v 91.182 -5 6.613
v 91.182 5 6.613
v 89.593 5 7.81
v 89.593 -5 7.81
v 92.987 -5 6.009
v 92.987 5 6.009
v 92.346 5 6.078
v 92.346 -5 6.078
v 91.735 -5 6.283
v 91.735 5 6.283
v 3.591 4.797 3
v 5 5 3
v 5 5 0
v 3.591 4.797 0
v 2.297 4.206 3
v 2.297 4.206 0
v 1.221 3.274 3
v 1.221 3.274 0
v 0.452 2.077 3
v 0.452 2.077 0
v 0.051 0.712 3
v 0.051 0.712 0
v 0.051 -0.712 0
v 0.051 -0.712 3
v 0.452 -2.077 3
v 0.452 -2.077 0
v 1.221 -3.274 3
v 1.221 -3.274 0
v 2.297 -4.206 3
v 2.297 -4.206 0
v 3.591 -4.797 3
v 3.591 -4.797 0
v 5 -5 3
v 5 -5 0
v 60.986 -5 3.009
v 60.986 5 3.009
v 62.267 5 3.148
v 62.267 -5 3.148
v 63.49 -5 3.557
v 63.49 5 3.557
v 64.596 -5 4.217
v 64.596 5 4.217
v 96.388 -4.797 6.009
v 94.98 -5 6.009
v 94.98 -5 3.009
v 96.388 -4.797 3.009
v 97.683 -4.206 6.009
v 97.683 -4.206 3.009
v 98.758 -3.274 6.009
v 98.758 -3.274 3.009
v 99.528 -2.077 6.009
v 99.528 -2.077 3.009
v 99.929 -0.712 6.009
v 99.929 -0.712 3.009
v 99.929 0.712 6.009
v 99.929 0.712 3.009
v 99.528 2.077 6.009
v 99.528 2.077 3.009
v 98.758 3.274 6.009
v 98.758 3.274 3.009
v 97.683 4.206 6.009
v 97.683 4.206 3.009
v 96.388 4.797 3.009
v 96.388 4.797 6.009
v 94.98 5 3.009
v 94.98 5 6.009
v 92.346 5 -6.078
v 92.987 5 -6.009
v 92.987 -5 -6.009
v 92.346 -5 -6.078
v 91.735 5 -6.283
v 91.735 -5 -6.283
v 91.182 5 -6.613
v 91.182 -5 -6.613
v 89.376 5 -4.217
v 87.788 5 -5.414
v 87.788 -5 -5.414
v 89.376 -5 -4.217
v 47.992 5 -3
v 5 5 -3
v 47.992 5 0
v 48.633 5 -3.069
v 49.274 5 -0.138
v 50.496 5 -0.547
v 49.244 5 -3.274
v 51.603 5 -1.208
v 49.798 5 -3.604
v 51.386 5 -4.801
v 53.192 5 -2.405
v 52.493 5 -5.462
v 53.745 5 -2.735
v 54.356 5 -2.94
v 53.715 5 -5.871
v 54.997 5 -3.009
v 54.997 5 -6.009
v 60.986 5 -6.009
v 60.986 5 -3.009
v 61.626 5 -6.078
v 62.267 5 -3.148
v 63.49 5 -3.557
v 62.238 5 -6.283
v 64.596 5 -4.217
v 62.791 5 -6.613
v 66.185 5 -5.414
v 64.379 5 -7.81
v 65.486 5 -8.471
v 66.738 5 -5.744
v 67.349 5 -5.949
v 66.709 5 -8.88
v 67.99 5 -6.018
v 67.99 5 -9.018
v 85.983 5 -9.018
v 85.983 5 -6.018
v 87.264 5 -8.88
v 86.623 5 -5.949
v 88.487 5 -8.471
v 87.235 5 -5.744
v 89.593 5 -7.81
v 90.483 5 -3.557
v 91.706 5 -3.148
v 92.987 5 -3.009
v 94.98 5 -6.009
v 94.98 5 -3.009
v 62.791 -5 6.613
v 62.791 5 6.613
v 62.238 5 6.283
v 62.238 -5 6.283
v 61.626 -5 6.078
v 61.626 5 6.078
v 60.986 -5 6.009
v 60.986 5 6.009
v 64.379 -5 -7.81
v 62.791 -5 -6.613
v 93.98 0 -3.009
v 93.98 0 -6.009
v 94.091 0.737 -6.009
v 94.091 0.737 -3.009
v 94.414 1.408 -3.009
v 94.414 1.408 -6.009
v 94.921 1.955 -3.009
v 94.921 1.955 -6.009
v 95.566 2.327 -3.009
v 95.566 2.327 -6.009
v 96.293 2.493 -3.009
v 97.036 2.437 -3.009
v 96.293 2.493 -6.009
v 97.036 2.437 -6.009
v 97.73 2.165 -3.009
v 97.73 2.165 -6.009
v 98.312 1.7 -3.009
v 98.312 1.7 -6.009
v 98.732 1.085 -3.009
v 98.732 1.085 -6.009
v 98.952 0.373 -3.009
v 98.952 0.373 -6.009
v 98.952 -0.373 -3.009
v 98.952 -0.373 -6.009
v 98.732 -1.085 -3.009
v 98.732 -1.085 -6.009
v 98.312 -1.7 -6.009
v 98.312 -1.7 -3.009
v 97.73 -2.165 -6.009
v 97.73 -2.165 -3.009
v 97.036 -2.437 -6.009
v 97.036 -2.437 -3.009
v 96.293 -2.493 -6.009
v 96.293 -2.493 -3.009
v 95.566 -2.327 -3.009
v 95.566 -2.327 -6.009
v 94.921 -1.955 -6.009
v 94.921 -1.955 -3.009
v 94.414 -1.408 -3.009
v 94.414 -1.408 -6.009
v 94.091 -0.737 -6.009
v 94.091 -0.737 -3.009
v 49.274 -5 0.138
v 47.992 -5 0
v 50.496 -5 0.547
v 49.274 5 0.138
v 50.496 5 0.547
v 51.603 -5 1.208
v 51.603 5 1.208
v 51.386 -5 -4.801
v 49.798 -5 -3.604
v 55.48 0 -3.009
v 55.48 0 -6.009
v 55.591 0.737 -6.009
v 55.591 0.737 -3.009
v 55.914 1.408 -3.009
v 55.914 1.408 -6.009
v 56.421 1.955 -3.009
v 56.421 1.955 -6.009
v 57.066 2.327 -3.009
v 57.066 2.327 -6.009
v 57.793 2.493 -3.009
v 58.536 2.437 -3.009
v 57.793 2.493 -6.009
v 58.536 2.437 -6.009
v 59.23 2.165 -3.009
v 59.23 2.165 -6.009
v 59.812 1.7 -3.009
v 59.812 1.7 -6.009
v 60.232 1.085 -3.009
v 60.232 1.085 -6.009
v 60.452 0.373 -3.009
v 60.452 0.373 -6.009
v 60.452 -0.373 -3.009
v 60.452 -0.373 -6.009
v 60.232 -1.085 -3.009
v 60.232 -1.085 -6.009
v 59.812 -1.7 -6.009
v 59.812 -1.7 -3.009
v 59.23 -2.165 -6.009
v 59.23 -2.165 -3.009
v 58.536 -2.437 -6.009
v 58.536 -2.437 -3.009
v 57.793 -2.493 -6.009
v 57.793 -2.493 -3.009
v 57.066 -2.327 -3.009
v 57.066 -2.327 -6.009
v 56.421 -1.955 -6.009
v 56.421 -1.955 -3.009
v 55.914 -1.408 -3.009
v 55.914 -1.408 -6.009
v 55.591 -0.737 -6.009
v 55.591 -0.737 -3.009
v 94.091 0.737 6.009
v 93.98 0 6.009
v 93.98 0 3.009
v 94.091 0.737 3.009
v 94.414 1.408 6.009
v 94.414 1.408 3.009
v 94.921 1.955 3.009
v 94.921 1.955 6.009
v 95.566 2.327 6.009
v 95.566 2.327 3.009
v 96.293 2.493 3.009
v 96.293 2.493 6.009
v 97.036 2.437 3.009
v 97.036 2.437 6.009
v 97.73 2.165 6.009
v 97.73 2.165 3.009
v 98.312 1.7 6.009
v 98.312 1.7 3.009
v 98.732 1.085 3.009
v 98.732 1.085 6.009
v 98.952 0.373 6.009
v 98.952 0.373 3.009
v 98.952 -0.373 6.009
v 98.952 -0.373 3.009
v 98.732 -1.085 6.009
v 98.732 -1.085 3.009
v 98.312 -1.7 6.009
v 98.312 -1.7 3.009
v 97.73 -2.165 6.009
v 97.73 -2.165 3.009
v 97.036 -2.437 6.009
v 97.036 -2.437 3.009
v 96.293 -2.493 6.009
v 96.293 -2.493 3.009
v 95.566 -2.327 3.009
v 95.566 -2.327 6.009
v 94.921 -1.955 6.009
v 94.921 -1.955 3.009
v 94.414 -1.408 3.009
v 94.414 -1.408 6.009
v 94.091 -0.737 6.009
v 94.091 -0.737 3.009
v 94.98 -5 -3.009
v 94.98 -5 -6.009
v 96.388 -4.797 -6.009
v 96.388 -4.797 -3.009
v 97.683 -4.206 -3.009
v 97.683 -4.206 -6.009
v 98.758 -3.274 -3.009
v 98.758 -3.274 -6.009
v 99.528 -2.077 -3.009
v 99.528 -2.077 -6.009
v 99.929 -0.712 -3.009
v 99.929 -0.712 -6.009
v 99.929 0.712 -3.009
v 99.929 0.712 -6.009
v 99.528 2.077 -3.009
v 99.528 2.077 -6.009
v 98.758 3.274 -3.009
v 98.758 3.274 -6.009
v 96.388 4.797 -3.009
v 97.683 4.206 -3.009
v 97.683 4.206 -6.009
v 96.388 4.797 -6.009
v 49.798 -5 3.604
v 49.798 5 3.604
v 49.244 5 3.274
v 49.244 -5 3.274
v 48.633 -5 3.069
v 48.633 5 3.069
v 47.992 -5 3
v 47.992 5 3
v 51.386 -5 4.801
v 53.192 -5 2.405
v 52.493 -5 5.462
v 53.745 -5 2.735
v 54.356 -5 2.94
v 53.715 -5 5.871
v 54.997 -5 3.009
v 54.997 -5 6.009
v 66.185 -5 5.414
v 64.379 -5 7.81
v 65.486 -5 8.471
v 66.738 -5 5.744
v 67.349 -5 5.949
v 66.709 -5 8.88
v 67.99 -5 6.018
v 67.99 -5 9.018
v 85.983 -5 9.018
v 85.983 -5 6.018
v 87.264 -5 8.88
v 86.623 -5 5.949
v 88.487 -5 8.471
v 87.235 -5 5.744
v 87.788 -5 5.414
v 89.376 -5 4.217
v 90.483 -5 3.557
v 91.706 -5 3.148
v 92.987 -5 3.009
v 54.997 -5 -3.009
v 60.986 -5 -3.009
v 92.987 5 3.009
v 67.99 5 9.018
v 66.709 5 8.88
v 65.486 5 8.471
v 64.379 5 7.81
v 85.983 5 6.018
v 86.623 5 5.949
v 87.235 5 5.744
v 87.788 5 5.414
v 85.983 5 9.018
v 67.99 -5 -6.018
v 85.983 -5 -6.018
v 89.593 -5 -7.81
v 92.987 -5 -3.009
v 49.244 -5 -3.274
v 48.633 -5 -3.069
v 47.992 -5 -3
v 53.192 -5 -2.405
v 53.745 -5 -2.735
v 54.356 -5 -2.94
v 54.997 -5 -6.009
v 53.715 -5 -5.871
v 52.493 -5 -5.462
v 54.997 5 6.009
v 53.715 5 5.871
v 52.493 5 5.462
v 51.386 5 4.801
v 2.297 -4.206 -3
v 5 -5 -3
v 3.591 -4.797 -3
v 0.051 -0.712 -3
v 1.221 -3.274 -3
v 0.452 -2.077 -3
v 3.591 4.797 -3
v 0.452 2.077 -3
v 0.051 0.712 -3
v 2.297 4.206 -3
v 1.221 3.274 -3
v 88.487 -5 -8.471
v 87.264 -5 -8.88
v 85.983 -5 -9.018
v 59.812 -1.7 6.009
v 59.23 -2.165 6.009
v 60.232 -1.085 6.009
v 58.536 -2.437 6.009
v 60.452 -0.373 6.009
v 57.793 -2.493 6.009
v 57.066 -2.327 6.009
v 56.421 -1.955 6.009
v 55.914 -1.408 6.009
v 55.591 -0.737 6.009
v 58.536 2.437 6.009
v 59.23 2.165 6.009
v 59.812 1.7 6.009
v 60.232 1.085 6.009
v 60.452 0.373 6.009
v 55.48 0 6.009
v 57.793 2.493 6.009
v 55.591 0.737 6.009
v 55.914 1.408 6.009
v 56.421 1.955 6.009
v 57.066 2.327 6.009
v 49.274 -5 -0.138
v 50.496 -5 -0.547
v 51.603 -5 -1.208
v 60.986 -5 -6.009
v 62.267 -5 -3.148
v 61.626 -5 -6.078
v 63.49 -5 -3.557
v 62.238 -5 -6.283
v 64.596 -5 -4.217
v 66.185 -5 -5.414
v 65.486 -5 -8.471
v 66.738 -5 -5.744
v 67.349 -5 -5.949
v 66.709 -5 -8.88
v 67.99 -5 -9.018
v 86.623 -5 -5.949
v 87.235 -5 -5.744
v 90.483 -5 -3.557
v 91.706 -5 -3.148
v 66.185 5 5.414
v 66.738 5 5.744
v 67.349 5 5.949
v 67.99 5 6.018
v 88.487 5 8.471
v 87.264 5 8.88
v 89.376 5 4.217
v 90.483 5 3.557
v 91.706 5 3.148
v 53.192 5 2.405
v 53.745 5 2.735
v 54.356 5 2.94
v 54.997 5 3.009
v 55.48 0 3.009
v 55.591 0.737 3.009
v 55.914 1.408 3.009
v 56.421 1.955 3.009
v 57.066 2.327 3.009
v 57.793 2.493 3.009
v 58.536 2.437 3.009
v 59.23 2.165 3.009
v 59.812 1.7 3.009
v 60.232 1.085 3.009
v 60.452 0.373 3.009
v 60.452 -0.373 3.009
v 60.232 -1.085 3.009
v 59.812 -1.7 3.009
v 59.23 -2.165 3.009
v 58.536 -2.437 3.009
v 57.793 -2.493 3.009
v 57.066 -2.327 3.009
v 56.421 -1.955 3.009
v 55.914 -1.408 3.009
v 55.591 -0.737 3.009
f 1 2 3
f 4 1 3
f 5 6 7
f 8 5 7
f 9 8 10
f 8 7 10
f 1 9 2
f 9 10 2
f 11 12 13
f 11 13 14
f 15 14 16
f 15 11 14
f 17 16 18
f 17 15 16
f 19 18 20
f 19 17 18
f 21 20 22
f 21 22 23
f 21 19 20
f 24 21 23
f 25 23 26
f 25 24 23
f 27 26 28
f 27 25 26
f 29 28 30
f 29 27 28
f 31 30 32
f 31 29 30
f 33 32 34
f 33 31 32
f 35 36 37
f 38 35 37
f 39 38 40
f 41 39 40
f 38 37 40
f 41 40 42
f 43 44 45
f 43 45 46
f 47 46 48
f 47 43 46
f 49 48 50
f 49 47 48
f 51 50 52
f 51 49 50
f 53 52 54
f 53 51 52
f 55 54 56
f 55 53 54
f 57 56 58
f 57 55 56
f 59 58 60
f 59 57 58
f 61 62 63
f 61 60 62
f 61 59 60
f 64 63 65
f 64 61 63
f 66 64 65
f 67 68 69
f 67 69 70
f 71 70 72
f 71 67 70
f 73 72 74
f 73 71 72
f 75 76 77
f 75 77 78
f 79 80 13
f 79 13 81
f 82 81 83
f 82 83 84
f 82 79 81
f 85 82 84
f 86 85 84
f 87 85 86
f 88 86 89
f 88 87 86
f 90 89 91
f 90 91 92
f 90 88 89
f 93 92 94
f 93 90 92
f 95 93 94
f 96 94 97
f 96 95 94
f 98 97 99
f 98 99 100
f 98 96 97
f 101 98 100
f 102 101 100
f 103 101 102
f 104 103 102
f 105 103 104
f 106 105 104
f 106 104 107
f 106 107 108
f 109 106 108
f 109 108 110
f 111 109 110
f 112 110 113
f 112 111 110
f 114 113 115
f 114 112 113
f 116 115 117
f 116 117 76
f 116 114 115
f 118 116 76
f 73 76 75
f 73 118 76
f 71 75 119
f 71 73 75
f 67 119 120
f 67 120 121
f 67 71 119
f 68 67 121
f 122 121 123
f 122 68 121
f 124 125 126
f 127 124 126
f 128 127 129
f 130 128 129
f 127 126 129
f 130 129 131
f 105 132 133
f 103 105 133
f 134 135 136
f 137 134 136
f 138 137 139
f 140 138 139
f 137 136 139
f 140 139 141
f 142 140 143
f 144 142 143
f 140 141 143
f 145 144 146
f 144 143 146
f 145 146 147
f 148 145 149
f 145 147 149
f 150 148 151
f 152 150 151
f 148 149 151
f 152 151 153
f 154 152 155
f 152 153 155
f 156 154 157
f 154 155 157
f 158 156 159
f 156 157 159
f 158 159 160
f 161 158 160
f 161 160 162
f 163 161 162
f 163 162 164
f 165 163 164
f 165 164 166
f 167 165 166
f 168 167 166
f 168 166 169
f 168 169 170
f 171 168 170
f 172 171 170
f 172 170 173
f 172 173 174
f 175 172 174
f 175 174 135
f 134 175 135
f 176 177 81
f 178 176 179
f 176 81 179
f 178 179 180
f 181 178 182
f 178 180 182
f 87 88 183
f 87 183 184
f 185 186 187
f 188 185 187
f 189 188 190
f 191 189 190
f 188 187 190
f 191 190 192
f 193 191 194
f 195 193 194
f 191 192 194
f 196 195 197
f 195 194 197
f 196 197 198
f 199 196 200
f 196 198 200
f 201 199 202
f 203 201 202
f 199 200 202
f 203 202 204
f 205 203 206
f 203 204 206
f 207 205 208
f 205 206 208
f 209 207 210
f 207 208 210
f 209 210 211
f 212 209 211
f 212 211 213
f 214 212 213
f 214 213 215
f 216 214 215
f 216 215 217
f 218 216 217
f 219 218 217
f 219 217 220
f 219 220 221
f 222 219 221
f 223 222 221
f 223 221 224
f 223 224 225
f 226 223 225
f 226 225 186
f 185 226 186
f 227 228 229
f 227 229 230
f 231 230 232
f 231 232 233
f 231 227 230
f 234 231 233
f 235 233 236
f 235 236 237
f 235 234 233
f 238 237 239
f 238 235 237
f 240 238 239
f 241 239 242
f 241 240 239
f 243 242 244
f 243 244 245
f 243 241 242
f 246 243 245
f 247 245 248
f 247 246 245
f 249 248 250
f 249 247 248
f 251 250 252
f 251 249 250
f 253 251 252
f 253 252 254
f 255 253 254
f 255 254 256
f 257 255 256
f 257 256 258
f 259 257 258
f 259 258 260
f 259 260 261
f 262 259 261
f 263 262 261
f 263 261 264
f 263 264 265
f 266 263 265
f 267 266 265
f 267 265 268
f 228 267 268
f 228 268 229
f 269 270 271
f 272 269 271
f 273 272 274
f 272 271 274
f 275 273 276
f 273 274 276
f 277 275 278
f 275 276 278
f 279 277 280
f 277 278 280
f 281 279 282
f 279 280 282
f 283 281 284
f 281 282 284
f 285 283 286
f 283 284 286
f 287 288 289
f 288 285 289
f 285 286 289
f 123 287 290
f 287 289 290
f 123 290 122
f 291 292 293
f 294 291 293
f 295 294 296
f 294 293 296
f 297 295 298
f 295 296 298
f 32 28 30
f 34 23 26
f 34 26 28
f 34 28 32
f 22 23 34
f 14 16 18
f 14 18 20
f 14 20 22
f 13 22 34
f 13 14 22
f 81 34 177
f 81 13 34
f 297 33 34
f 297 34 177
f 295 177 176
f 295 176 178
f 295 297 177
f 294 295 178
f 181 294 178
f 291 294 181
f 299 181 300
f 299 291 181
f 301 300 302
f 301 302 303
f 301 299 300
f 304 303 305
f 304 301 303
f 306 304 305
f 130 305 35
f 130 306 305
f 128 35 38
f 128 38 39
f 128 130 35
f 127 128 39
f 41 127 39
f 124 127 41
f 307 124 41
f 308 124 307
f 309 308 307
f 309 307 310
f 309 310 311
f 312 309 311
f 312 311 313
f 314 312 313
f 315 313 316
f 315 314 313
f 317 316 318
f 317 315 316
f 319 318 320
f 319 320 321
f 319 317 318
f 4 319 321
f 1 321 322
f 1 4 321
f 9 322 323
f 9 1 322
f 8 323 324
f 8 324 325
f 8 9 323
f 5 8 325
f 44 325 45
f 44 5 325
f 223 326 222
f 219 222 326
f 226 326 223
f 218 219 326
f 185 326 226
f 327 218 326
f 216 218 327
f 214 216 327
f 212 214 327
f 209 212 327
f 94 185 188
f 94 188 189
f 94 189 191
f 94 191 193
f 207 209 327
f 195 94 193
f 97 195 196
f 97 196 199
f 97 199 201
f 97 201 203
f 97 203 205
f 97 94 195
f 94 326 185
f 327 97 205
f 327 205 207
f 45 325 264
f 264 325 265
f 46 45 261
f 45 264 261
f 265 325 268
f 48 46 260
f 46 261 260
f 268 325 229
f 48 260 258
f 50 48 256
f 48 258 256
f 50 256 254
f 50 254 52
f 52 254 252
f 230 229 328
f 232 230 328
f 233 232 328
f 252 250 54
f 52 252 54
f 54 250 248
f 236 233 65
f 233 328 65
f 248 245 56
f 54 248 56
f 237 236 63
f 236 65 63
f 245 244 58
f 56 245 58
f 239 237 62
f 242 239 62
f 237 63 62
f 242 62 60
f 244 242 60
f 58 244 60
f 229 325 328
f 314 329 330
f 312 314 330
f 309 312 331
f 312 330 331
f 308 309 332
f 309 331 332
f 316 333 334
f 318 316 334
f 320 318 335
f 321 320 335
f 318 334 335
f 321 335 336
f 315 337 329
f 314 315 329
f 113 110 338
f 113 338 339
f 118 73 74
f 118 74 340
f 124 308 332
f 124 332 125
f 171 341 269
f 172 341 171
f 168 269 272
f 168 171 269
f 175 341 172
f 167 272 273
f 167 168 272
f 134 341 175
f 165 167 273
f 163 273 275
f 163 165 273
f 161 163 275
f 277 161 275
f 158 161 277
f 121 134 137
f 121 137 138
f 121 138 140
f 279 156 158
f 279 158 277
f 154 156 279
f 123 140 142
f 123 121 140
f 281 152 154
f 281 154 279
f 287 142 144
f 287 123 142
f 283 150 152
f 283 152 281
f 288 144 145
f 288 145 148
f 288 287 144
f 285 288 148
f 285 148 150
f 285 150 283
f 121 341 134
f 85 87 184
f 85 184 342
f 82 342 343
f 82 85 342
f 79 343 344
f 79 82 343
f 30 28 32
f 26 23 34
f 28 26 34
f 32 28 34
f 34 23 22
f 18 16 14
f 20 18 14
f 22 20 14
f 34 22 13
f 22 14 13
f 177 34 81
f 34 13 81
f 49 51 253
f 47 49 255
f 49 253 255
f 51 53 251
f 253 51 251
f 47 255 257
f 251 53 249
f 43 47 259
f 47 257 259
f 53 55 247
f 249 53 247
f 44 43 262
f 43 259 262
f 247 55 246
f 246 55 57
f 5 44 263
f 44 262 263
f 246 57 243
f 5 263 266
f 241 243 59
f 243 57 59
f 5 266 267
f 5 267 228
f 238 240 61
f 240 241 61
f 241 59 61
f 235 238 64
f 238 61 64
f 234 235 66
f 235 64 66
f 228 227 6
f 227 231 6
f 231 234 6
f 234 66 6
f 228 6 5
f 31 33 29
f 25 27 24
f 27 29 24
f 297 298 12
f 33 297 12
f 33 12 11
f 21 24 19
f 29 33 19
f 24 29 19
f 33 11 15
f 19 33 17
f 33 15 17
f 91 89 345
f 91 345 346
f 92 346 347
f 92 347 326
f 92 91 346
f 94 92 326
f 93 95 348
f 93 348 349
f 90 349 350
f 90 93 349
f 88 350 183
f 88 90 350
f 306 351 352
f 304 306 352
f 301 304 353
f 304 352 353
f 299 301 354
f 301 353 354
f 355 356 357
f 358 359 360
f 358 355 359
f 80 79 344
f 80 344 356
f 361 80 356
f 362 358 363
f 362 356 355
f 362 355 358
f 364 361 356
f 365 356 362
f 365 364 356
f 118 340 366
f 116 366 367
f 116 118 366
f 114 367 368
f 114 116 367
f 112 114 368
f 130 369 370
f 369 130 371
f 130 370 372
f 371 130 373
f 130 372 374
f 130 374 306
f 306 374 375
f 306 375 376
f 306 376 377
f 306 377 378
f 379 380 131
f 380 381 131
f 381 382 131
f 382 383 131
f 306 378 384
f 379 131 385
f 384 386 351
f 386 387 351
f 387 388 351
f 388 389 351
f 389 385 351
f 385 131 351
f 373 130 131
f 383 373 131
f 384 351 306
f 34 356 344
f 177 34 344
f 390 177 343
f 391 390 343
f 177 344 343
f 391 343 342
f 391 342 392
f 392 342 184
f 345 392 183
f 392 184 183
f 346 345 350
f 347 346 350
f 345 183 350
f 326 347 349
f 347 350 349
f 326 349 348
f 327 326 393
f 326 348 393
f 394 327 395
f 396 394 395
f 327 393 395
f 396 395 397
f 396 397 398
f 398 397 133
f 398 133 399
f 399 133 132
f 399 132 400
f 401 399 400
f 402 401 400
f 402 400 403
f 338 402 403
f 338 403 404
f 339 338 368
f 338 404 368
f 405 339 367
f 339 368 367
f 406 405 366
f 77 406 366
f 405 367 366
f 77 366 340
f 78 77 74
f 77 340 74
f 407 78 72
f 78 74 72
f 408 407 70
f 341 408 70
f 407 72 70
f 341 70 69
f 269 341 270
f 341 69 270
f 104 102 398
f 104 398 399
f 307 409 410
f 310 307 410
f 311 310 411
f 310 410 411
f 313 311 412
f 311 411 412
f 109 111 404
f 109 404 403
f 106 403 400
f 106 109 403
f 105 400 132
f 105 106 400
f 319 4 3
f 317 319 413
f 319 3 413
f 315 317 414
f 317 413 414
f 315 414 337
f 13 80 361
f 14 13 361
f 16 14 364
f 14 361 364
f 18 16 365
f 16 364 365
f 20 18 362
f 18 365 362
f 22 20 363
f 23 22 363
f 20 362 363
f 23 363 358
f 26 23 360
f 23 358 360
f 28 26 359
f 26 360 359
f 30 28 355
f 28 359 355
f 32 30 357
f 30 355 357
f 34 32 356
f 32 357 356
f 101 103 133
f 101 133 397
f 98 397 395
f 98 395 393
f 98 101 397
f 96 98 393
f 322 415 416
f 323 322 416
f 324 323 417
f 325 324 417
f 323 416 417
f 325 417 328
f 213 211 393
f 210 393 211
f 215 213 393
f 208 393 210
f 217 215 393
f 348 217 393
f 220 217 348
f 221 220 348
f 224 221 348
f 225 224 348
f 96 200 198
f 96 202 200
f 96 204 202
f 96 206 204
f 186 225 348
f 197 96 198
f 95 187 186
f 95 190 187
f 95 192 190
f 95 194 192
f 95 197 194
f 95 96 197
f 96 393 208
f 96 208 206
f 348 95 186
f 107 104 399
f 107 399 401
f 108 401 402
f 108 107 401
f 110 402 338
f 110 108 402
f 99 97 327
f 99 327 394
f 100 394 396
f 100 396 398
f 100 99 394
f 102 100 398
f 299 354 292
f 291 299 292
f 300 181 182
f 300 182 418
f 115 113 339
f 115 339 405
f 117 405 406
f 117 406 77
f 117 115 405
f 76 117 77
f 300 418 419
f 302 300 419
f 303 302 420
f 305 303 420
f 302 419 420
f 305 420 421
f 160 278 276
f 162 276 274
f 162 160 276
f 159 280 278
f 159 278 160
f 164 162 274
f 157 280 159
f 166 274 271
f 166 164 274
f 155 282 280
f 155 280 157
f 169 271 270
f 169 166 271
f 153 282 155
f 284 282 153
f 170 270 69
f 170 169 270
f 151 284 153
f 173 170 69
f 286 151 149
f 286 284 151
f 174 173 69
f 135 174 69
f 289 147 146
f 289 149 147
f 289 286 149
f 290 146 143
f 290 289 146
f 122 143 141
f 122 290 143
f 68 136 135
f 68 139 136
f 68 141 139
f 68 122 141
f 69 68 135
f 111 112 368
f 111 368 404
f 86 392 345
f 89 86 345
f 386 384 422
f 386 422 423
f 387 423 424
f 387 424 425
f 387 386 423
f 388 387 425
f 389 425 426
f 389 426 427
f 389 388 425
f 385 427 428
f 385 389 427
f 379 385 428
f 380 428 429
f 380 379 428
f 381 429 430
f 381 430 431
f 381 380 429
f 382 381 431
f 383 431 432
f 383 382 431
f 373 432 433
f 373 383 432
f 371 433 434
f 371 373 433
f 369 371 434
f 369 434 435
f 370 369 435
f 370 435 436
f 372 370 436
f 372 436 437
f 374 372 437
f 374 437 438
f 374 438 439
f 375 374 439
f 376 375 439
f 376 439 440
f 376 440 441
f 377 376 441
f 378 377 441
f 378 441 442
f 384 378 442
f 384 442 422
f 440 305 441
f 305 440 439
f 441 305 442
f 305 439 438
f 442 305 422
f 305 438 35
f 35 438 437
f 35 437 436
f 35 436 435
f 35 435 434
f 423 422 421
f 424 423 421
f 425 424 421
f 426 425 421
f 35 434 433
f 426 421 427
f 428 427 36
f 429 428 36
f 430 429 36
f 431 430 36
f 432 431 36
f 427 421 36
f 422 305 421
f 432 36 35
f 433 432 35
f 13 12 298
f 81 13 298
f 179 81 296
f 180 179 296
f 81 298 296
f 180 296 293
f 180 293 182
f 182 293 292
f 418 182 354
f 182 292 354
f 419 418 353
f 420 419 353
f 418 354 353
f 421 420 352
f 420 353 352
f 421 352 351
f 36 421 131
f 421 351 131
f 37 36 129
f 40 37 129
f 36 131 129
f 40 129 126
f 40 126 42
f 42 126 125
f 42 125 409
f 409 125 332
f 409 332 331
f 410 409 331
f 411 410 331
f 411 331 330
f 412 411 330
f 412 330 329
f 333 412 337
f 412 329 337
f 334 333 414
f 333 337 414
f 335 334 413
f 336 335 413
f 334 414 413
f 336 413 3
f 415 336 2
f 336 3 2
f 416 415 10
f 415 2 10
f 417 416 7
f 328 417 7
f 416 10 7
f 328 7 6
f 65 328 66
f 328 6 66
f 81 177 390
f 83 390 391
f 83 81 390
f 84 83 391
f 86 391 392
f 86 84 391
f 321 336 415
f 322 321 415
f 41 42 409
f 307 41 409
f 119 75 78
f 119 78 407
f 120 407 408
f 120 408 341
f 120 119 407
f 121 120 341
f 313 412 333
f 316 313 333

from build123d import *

# Parameters (mm, degrees)
BASE_FLANGE1_DEPTH = 5
SKETCH6_OUTSIDE_W  = 122.156
SKETCH6_OUTSIDE_H  = 32.176
CUT_EXTRUDE1_DEPTH = 101.509870076
SKETCH7_R          = 2.5
CUT_EXTRUDE2_DEPTH = 10


# Sheet-metal steps are written as plain solids
with BuildPart() as part:
    # Sketch1 → Base-Flange1 (new, symmetric)
    with BuildSketch(Plane(origin=(0, 0, 0), x_dir=(1, 0, 0), z_dir=(0, 1, 0))):
        with BuildLine():
            Line((0, 0), (47.992428083, 0))
            ThreePointArc((47.992428083, 0), (49.896256021, 0.310058069), (51.603318222, 1.20818694))
            Line((51.603318222, 1.20818694), (53.191518439, 2.404981646))
            ThreePointArc((53.191518439, 2.404981646), (54.04504954, 2.854046081), (54.996963509, 3.009075116))
            Line((54.996963509, 3.009075116), (60.985605633, 3.009075116))
            ThreePointArc((60.985605633, 3.009075116), (62.889433572, 3.319133185), (64.596495772, 4.217262055))
            Line((64.596495772, 4.217262055), (66.18469599, 5.414056762))
            ThreePointArc((66.18469599, 5.414056762), (67.03822709, 5.863121197), (67.990141059, 6.018150232))
            Line((67.990141059, 6.018150232), (85.982569142, 6.018150232))
            ThreePointArc((85.982569142, 6.018150232), (86.934483111, 5.863121197), (87.788014211, 5.414056762))
            Line((87.788014211, 5.414056762), (89.376214429, 4.217262055))
            ThreePointArc((89.376214429, 4.217262055), (91.083276629, 3.319133185), (92.987104568, 3.009075116))
            Line((92.987104568, 3.009075116), (99.979532651, 3.009075116))
            Line((99.979532651, 3.009075116), (99.979532651, 6.009075116))
            Line((99.979532651, 6.009075116), (92.987104568, 6.009075116))
            ThreePointArc((92.987104568, 6.009075116), (92.035190599, 6.16410415), (91.181659498, 6.613168586))
            Line((91.181659498, 6.613168586), (89.593459281, 7.809963292))
            ThreePointArc((89.593459281, 7.809963292), (87.88639708, 8.708092163), (85.982569142, 9.018150232))
            Line((85.982569142, 9.018150232), (67.990141059, 9.018150232))
            ThreePointArc((67.990141059, 9.018150232), (66.086313121, 8.708092163), (64.37925092, 7.809963292))
            Line((64.37925092, 7.809963292), (62.791050703, 6.613168586))
            ThreePointArc((62.791050703, 6.613168586), (61.937519602, 6.16410415), (60.985605633, 6.009075116))
            Line((60.985605633, 6.009075116), (54.996963509, 6.009075116))
            ThreePointArc((54.996963509, 6.009075116), (53.09313557, 5.699017047), (51.38607337, 4.800888176))
            Line((51.38607337, 4.800888176), (49.797873152, 3.60409347))
            ThreePointArc((49.797873152, 3.60409347), (48.944342052, 3.155029034), (47.992428083, 3))
            Line((47.992428083, 3), (0, 3))
            Line((0, 3), (0, 0))
        make_face()
    extrude(amount=BASE_FLANGE1_DEPTH, both=True)

    # Sketch6 outside → Cut-Extrude1 (cut, through all)
    with BuildSketch(Plane(origin=(0, 0, -9.018150232), x_dir=(-1, 0, 0), z_dir=(0, 0, -1))):
        with Locations((-49.99, 0)):
            Rectangle(SKETCH6_OUTSIDE_W, SKETCH6_OUTSIDE_H)
        with BuildLine():
            Line((-94.979532651, 5), (-5, 5))
            ThreePointArc((-5, 5), (0, 0), (-5, -5))
            Line((-5, -5), (-94.979532651, -5))
            ThreePointArc((-94.979532651, -5), (-99.979532651, 0), (-94.979532651, 5))
        make_face(mode=Mode.SUBTRACT)
    extrude(amount=-CUT_EXTRUDE1_DEPTH, mode=Mode.SUBTRACT)

    # Sketch7 → Cut-Extrude2 (cut)
    with BuildSketch(Plane(origin=(0, 0, -6.009075116), x_dir=(-1, 0, 0), z_dir=(0, 0, -1))):
        with Locations((-96.479532651, 0)):
            Circle(SKETCH7_R)
        with Locations((-57.979532651, 0)):
            Circle(SKETCH7_R)
    extrude(amount=-CUT_EXTRUDE2_DEPTH, mode=Mode.SUBTRACT)


with BuildPart() as body_2:
    # Mirror1: mirrored copy
    add(part.part.mirror(Plane.XY))


solid = Compound([part.part, body_2.part])
